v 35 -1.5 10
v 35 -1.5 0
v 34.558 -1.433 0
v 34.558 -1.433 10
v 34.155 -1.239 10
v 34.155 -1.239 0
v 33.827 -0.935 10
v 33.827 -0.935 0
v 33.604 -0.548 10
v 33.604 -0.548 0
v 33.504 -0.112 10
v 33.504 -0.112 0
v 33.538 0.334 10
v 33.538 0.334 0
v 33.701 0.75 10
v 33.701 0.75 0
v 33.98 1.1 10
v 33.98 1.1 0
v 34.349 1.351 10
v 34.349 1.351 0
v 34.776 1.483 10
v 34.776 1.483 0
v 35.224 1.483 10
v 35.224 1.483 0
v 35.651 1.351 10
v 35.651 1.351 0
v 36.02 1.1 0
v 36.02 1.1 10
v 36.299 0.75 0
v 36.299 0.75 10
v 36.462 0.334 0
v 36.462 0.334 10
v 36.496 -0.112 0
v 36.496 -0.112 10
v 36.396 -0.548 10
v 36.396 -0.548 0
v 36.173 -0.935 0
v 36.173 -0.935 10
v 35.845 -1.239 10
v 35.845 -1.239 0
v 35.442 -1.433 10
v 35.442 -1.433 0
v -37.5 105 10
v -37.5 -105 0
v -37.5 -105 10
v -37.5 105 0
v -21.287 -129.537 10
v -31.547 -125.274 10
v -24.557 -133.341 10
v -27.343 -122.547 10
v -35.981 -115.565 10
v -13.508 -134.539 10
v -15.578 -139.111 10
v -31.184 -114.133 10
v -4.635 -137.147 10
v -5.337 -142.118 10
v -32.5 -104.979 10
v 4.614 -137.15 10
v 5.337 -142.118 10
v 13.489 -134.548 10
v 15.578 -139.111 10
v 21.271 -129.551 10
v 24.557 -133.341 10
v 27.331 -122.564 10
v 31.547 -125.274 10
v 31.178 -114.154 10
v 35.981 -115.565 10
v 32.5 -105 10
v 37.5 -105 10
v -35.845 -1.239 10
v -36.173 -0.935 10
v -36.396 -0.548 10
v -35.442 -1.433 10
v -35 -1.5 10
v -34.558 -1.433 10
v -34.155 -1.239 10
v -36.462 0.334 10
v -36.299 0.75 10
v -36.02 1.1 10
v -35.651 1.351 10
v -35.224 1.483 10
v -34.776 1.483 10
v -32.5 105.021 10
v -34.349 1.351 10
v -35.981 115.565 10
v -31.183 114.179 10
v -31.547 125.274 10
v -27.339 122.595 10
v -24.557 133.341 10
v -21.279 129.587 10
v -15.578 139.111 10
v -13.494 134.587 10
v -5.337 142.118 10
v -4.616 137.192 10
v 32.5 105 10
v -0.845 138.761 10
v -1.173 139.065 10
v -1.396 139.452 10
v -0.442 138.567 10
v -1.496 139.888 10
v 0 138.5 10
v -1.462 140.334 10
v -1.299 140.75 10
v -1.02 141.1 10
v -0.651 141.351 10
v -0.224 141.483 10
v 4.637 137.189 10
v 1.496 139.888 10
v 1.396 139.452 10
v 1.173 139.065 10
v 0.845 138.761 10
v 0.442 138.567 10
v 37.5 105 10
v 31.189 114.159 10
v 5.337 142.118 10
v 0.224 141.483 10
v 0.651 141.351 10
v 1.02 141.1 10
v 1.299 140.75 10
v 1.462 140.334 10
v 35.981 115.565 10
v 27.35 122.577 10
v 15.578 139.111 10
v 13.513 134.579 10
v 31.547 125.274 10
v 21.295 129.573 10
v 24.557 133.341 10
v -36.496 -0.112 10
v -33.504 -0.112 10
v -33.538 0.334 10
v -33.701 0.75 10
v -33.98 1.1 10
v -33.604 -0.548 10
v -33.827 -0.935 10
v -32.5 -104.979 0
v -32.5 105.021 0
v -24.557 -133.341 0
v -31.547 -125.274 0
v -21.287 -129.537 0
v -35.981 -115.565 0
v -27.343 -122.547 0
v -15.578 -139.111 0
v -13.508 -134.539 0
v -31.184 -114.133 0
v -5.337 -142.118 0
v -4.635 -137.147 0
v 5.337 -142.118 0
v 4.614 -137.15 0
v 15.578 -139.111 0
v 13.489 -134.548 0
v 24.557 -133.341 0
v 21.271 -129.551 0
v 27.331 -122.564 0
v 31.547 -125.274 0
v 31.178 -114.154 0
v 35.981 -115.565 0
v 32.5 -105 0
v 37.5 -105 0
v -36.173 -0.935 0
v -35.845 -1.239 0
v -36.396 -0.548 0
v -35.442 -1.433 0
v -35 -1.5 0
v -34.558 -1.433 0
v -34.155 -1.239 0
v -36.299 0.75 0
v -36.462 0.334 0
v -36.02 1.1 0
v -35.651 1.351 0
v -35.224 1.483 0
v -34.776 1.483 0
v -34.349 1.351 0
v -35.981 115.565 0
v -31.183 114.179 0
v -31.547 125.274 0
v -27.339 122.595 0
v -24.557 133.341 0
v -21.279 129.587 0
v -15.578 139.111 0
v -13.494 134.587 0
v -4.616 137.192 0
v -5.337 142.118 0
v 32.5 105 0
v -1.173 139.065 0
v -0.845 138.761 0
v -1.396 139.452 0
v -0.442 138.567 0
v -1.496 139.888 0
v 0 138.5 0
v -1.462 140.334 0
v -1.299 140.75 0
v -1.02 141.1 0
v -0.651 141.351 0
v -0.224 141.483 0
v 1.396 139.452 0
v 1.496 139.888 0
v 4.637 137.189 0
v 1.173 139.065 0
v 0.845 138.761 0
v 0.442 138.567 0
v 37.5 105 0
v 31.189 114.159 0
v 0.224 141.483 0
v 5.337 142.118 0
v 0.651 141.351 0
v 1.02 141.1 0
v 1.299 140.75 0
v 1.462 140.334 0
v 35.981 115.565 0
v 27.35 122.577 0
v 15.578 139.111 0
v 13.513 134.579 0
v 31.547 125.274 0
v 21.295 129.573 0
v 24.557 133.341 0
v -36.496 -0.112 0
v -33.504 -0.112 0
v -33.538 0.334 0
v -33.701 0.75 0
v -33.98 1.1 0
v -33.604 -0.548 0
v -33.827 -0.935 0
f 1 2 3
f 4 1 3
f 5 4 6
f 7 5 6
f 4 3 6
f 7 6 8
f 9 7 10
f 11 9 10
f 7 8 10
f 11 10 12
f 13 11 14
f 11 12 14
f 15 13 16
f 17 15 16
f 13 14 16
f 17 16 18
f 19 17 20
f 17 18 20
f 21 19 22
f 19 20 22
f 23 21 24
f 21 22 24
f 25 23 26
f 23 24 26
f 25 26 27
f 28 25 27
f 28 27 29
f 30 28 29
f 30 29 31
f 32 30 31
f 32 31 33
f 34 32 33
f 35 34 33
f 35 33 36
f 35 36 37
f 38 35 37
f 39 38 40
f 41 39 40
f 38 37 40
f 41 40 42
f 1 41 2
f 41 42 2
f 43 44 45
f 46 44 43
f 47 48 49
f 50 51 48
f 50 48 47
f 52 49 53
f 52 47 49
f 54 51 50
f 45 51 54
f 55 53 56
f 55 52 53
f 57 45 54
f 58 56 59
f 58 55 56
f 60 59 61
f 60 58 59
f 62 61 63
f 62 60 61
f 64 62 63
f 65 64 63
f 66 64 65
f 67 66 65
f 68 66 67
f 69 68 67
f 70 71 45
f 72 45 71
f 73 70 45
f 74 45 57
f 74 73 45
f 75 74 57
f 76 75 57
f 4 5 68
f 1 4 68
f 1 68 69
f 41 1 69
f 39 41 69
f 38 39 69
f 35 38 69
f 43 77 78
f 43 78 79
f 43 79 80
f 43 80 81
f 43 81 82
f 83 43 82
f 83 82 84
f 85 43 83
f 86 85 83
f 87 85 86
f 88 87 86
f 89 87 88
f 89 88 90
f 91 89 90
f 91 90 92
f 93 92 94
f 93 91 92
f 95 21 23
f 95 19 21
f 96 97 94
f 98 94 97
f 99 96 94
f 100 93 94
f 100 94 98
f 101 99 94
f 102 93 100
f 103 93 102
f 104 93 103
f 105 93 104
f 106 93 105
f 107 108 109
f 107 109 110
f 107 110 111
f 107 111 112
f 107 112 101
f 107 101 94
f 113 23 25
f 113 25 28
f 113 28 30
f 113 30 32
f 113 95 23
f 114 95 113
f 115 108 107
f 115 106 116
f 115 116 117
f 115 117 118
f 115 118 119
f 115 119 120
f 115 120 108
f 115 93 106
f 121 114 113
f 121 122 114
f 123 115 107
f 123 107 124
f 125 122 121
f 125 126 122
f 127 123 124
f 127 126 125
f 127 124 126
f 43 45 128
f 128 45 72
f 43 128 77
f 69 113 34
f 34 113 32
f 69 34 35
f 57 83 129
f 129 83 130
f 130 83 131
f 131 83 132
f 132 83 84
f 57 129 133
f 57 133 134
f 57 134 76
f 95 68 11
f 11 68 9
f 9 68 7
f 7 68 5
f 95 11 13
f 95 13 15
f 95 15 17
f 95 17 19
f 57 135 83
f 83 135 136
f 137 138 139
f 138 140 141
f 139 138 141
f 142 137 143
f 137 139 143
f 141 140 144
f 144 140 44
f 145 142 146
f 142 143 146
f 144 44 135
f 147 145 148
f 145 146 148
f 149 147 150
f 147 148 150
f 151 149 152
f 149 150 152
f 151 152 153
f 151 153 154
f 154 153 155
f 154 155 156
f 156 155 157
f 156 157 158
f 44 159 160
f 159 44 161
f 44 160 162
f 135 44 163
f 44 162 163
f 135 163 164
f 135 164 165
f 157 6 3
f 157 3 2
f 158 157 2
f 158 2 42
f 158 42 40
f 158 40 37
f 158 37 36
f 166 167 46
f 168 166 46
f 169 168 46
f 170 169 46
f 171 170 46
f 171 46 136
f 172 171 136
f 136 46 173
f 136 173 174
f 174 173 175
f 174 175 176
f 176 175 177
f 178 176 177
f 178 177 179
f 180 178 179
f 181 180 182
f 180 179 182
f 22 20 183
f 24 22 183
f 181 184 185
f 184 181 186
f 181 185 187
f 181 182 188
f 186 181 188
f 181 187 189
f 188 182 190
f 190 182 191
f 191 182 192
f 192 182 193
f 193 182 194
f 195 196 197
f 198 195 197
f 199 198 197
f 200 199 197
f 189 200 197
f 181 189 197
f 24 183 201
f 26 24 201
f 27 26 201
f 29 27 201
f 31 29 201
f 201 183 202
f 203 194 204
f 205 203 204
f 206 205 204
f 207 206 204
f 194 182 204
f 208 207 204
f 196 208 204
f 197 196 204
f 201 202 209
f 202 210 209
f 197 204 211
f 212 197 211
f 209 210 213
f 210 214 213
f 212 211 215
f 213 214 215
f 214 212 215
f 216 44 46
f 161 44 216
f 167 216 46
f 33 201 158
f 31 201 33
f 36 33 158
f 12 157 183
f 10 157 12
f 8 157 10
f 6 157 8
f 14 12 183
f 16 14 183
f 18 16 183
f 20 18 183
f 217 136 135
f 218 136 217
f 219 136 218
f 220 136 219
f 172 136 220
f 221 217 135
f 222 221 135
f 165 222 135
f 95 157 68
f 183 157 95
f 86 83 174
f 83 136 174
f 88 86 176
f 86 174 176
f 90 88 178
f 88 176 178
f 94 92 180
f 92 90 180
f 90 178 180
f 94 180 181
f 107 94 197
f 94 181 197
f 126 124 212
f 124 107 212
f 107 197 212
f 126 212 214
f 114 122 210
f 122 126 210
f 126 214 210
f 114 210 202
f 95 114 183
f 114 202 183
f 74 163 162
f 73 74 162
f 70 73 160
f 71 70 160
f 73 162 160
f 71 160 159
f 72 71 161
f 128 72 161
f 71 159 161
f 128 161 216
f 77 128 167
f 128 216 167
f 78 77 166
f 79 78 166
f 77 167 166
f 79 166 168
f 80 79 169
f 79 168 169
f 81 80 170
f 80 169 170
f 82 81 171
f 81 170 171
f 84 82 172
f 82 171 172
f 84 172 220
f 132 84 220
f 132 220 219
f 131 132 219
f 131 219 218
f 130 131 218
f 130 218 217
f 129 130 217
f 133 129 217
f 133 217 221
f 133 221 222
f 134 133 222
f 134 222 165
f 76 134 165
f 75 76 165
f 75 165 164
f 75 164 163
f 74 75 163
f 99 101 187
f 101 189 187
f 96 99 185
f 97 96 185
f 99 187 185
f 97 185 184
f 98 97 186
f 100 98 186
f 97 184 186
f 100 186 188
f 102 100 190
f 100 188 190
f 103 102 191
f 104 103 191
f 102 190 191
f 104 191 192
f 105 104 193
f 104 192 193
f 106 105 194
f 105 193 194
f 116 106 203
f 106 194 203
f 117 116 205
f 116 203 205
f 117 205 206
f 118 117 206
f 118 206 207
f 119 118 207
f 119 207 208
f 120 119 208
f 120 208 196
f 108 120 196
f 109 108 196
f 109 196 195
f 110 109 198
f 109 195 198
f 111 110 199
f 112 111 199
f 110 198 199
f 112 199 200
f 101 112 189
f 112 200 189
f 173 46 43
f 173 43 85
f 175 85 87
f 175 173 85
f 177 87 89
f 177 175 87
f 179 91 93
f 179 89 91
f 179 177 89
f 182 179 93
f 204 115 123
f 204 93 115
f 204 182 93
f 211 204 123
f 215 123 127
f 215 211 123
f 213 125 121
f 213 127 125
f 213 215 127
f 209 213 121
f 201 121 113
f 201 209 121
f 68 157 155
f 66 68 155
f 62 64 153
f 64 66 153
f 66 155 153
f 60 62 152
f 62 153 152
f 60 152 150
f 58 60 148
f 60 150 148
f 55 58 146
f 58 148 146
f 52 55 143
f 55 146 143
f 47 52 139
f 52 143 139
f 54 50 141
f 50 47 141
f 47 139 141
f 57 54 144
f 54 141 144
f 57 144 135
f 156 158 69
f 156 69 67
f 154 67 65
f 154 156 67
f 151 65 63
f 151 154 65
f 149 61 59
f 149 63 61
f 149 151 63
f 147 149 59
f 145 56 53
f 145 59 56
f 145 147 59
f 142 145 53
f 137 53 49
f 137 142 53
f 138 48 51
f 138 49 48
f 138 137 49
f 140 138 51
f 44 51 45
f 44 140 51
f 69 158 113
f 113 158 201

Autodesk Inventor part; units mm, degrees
ref_plane "YZ Plane" through (0, 0, 0) normal (1, 0, 0) x (0, 1, 0)
ref_plane "XZ Plane" through (0, 0, 0) normal (0, 1, 0) x (-1, 0, 0)
ref_plane "XY Plane" through (0, 0, 0) normal (0, 0, 1) x (1, 0, 0)
sketch "Sketch1" plane through (0, 0, 0) normal (0, 0, 1) x (1, 0, 0)
  line L0 (-32.5001, -104.9789) -> (-32.5001, 105.0211)
  line L1 (-32.5001, -104.9789) -> (177.4999, -104.9789) construction
  line L2 (32.5001, -105) -> (32.5001, 105)
  line L3 (32.5001, -105) -> (242.5001, -105) construction
  arc A0 (32.5001, 105) -> (-32.5001, 105.0211) centre (0, 105.0211) ccw
  arc A1 (-32.5001, -104.9789) -> (32.5001, -105) centre (0, -104.9789) ccw
  line L4 (-37.5, -105) -> (-37.5, 105)
  line L5 (-37.5, -105) -> (172.5, -105) construction
  line L6 (37.5, -105) -> (37.5, 105)
  line L7 (37.5, -105) -> (247.5, -105) construction
  arc A2 (-37.5, -105) -> (37.5, -105) centre (0, -105) ccw
  arc A3 (37.5, 105) -> (-37.5, 105) centre (0, 105) ccw
  point P0 (0, 0)
  dimension "d0" = 210
  dimension "d1" = 90
  dimension "d2" = 210
  dimension "d3" = 90
  dimension "d4" = 210
  dimension "d5" = 90
  dimension "d6" = 210
  dimension "d7" = 90
extrude "Extrusion1" add sketch "Sketch1" along normal blind 10
sketch "Sketch3" plane through (0, 0, 10) normal (0, 0, 1) x (1, 0, 0)
  circle A0 centre (-35, 0) radius 1.5
  circle A1 centre (0, -140) radius 1.5
  circle A2 centre (35, 0) radius 1.5
  point P0 (0, 0)
  dimension "d11" = 3
  dimension "d12" = 3
  dimension "d13" = 3
hole "Hole1" at (-35, 0, 10) direction (0, 0, -1) diameter 3 end through all
sketch "Sketch5" plane through (0, 0, 10) normal (0, 0, 1) x (1, 0, 0)
  circle A0 centre (35, 0) radius 1.5
  point P0 (0, 0)
  dimension "d31" = 3
hole "Hole3" at (35, 0, 10) direction (0, 0, -1) diameter 3 end through all
sketch "Sketch6" plane through (0, 0, 10) normal (0, 0, 1) x (1, 0, 0)
  circle A0 centre (0, 140) radius 1.5
  point P0 (0, 0)
  dimension "d39" = 3
hole "Hole4" at (0, 140, 10) direction (0, 0, -1) diameter 3 end through all
properties part number "Chain"
